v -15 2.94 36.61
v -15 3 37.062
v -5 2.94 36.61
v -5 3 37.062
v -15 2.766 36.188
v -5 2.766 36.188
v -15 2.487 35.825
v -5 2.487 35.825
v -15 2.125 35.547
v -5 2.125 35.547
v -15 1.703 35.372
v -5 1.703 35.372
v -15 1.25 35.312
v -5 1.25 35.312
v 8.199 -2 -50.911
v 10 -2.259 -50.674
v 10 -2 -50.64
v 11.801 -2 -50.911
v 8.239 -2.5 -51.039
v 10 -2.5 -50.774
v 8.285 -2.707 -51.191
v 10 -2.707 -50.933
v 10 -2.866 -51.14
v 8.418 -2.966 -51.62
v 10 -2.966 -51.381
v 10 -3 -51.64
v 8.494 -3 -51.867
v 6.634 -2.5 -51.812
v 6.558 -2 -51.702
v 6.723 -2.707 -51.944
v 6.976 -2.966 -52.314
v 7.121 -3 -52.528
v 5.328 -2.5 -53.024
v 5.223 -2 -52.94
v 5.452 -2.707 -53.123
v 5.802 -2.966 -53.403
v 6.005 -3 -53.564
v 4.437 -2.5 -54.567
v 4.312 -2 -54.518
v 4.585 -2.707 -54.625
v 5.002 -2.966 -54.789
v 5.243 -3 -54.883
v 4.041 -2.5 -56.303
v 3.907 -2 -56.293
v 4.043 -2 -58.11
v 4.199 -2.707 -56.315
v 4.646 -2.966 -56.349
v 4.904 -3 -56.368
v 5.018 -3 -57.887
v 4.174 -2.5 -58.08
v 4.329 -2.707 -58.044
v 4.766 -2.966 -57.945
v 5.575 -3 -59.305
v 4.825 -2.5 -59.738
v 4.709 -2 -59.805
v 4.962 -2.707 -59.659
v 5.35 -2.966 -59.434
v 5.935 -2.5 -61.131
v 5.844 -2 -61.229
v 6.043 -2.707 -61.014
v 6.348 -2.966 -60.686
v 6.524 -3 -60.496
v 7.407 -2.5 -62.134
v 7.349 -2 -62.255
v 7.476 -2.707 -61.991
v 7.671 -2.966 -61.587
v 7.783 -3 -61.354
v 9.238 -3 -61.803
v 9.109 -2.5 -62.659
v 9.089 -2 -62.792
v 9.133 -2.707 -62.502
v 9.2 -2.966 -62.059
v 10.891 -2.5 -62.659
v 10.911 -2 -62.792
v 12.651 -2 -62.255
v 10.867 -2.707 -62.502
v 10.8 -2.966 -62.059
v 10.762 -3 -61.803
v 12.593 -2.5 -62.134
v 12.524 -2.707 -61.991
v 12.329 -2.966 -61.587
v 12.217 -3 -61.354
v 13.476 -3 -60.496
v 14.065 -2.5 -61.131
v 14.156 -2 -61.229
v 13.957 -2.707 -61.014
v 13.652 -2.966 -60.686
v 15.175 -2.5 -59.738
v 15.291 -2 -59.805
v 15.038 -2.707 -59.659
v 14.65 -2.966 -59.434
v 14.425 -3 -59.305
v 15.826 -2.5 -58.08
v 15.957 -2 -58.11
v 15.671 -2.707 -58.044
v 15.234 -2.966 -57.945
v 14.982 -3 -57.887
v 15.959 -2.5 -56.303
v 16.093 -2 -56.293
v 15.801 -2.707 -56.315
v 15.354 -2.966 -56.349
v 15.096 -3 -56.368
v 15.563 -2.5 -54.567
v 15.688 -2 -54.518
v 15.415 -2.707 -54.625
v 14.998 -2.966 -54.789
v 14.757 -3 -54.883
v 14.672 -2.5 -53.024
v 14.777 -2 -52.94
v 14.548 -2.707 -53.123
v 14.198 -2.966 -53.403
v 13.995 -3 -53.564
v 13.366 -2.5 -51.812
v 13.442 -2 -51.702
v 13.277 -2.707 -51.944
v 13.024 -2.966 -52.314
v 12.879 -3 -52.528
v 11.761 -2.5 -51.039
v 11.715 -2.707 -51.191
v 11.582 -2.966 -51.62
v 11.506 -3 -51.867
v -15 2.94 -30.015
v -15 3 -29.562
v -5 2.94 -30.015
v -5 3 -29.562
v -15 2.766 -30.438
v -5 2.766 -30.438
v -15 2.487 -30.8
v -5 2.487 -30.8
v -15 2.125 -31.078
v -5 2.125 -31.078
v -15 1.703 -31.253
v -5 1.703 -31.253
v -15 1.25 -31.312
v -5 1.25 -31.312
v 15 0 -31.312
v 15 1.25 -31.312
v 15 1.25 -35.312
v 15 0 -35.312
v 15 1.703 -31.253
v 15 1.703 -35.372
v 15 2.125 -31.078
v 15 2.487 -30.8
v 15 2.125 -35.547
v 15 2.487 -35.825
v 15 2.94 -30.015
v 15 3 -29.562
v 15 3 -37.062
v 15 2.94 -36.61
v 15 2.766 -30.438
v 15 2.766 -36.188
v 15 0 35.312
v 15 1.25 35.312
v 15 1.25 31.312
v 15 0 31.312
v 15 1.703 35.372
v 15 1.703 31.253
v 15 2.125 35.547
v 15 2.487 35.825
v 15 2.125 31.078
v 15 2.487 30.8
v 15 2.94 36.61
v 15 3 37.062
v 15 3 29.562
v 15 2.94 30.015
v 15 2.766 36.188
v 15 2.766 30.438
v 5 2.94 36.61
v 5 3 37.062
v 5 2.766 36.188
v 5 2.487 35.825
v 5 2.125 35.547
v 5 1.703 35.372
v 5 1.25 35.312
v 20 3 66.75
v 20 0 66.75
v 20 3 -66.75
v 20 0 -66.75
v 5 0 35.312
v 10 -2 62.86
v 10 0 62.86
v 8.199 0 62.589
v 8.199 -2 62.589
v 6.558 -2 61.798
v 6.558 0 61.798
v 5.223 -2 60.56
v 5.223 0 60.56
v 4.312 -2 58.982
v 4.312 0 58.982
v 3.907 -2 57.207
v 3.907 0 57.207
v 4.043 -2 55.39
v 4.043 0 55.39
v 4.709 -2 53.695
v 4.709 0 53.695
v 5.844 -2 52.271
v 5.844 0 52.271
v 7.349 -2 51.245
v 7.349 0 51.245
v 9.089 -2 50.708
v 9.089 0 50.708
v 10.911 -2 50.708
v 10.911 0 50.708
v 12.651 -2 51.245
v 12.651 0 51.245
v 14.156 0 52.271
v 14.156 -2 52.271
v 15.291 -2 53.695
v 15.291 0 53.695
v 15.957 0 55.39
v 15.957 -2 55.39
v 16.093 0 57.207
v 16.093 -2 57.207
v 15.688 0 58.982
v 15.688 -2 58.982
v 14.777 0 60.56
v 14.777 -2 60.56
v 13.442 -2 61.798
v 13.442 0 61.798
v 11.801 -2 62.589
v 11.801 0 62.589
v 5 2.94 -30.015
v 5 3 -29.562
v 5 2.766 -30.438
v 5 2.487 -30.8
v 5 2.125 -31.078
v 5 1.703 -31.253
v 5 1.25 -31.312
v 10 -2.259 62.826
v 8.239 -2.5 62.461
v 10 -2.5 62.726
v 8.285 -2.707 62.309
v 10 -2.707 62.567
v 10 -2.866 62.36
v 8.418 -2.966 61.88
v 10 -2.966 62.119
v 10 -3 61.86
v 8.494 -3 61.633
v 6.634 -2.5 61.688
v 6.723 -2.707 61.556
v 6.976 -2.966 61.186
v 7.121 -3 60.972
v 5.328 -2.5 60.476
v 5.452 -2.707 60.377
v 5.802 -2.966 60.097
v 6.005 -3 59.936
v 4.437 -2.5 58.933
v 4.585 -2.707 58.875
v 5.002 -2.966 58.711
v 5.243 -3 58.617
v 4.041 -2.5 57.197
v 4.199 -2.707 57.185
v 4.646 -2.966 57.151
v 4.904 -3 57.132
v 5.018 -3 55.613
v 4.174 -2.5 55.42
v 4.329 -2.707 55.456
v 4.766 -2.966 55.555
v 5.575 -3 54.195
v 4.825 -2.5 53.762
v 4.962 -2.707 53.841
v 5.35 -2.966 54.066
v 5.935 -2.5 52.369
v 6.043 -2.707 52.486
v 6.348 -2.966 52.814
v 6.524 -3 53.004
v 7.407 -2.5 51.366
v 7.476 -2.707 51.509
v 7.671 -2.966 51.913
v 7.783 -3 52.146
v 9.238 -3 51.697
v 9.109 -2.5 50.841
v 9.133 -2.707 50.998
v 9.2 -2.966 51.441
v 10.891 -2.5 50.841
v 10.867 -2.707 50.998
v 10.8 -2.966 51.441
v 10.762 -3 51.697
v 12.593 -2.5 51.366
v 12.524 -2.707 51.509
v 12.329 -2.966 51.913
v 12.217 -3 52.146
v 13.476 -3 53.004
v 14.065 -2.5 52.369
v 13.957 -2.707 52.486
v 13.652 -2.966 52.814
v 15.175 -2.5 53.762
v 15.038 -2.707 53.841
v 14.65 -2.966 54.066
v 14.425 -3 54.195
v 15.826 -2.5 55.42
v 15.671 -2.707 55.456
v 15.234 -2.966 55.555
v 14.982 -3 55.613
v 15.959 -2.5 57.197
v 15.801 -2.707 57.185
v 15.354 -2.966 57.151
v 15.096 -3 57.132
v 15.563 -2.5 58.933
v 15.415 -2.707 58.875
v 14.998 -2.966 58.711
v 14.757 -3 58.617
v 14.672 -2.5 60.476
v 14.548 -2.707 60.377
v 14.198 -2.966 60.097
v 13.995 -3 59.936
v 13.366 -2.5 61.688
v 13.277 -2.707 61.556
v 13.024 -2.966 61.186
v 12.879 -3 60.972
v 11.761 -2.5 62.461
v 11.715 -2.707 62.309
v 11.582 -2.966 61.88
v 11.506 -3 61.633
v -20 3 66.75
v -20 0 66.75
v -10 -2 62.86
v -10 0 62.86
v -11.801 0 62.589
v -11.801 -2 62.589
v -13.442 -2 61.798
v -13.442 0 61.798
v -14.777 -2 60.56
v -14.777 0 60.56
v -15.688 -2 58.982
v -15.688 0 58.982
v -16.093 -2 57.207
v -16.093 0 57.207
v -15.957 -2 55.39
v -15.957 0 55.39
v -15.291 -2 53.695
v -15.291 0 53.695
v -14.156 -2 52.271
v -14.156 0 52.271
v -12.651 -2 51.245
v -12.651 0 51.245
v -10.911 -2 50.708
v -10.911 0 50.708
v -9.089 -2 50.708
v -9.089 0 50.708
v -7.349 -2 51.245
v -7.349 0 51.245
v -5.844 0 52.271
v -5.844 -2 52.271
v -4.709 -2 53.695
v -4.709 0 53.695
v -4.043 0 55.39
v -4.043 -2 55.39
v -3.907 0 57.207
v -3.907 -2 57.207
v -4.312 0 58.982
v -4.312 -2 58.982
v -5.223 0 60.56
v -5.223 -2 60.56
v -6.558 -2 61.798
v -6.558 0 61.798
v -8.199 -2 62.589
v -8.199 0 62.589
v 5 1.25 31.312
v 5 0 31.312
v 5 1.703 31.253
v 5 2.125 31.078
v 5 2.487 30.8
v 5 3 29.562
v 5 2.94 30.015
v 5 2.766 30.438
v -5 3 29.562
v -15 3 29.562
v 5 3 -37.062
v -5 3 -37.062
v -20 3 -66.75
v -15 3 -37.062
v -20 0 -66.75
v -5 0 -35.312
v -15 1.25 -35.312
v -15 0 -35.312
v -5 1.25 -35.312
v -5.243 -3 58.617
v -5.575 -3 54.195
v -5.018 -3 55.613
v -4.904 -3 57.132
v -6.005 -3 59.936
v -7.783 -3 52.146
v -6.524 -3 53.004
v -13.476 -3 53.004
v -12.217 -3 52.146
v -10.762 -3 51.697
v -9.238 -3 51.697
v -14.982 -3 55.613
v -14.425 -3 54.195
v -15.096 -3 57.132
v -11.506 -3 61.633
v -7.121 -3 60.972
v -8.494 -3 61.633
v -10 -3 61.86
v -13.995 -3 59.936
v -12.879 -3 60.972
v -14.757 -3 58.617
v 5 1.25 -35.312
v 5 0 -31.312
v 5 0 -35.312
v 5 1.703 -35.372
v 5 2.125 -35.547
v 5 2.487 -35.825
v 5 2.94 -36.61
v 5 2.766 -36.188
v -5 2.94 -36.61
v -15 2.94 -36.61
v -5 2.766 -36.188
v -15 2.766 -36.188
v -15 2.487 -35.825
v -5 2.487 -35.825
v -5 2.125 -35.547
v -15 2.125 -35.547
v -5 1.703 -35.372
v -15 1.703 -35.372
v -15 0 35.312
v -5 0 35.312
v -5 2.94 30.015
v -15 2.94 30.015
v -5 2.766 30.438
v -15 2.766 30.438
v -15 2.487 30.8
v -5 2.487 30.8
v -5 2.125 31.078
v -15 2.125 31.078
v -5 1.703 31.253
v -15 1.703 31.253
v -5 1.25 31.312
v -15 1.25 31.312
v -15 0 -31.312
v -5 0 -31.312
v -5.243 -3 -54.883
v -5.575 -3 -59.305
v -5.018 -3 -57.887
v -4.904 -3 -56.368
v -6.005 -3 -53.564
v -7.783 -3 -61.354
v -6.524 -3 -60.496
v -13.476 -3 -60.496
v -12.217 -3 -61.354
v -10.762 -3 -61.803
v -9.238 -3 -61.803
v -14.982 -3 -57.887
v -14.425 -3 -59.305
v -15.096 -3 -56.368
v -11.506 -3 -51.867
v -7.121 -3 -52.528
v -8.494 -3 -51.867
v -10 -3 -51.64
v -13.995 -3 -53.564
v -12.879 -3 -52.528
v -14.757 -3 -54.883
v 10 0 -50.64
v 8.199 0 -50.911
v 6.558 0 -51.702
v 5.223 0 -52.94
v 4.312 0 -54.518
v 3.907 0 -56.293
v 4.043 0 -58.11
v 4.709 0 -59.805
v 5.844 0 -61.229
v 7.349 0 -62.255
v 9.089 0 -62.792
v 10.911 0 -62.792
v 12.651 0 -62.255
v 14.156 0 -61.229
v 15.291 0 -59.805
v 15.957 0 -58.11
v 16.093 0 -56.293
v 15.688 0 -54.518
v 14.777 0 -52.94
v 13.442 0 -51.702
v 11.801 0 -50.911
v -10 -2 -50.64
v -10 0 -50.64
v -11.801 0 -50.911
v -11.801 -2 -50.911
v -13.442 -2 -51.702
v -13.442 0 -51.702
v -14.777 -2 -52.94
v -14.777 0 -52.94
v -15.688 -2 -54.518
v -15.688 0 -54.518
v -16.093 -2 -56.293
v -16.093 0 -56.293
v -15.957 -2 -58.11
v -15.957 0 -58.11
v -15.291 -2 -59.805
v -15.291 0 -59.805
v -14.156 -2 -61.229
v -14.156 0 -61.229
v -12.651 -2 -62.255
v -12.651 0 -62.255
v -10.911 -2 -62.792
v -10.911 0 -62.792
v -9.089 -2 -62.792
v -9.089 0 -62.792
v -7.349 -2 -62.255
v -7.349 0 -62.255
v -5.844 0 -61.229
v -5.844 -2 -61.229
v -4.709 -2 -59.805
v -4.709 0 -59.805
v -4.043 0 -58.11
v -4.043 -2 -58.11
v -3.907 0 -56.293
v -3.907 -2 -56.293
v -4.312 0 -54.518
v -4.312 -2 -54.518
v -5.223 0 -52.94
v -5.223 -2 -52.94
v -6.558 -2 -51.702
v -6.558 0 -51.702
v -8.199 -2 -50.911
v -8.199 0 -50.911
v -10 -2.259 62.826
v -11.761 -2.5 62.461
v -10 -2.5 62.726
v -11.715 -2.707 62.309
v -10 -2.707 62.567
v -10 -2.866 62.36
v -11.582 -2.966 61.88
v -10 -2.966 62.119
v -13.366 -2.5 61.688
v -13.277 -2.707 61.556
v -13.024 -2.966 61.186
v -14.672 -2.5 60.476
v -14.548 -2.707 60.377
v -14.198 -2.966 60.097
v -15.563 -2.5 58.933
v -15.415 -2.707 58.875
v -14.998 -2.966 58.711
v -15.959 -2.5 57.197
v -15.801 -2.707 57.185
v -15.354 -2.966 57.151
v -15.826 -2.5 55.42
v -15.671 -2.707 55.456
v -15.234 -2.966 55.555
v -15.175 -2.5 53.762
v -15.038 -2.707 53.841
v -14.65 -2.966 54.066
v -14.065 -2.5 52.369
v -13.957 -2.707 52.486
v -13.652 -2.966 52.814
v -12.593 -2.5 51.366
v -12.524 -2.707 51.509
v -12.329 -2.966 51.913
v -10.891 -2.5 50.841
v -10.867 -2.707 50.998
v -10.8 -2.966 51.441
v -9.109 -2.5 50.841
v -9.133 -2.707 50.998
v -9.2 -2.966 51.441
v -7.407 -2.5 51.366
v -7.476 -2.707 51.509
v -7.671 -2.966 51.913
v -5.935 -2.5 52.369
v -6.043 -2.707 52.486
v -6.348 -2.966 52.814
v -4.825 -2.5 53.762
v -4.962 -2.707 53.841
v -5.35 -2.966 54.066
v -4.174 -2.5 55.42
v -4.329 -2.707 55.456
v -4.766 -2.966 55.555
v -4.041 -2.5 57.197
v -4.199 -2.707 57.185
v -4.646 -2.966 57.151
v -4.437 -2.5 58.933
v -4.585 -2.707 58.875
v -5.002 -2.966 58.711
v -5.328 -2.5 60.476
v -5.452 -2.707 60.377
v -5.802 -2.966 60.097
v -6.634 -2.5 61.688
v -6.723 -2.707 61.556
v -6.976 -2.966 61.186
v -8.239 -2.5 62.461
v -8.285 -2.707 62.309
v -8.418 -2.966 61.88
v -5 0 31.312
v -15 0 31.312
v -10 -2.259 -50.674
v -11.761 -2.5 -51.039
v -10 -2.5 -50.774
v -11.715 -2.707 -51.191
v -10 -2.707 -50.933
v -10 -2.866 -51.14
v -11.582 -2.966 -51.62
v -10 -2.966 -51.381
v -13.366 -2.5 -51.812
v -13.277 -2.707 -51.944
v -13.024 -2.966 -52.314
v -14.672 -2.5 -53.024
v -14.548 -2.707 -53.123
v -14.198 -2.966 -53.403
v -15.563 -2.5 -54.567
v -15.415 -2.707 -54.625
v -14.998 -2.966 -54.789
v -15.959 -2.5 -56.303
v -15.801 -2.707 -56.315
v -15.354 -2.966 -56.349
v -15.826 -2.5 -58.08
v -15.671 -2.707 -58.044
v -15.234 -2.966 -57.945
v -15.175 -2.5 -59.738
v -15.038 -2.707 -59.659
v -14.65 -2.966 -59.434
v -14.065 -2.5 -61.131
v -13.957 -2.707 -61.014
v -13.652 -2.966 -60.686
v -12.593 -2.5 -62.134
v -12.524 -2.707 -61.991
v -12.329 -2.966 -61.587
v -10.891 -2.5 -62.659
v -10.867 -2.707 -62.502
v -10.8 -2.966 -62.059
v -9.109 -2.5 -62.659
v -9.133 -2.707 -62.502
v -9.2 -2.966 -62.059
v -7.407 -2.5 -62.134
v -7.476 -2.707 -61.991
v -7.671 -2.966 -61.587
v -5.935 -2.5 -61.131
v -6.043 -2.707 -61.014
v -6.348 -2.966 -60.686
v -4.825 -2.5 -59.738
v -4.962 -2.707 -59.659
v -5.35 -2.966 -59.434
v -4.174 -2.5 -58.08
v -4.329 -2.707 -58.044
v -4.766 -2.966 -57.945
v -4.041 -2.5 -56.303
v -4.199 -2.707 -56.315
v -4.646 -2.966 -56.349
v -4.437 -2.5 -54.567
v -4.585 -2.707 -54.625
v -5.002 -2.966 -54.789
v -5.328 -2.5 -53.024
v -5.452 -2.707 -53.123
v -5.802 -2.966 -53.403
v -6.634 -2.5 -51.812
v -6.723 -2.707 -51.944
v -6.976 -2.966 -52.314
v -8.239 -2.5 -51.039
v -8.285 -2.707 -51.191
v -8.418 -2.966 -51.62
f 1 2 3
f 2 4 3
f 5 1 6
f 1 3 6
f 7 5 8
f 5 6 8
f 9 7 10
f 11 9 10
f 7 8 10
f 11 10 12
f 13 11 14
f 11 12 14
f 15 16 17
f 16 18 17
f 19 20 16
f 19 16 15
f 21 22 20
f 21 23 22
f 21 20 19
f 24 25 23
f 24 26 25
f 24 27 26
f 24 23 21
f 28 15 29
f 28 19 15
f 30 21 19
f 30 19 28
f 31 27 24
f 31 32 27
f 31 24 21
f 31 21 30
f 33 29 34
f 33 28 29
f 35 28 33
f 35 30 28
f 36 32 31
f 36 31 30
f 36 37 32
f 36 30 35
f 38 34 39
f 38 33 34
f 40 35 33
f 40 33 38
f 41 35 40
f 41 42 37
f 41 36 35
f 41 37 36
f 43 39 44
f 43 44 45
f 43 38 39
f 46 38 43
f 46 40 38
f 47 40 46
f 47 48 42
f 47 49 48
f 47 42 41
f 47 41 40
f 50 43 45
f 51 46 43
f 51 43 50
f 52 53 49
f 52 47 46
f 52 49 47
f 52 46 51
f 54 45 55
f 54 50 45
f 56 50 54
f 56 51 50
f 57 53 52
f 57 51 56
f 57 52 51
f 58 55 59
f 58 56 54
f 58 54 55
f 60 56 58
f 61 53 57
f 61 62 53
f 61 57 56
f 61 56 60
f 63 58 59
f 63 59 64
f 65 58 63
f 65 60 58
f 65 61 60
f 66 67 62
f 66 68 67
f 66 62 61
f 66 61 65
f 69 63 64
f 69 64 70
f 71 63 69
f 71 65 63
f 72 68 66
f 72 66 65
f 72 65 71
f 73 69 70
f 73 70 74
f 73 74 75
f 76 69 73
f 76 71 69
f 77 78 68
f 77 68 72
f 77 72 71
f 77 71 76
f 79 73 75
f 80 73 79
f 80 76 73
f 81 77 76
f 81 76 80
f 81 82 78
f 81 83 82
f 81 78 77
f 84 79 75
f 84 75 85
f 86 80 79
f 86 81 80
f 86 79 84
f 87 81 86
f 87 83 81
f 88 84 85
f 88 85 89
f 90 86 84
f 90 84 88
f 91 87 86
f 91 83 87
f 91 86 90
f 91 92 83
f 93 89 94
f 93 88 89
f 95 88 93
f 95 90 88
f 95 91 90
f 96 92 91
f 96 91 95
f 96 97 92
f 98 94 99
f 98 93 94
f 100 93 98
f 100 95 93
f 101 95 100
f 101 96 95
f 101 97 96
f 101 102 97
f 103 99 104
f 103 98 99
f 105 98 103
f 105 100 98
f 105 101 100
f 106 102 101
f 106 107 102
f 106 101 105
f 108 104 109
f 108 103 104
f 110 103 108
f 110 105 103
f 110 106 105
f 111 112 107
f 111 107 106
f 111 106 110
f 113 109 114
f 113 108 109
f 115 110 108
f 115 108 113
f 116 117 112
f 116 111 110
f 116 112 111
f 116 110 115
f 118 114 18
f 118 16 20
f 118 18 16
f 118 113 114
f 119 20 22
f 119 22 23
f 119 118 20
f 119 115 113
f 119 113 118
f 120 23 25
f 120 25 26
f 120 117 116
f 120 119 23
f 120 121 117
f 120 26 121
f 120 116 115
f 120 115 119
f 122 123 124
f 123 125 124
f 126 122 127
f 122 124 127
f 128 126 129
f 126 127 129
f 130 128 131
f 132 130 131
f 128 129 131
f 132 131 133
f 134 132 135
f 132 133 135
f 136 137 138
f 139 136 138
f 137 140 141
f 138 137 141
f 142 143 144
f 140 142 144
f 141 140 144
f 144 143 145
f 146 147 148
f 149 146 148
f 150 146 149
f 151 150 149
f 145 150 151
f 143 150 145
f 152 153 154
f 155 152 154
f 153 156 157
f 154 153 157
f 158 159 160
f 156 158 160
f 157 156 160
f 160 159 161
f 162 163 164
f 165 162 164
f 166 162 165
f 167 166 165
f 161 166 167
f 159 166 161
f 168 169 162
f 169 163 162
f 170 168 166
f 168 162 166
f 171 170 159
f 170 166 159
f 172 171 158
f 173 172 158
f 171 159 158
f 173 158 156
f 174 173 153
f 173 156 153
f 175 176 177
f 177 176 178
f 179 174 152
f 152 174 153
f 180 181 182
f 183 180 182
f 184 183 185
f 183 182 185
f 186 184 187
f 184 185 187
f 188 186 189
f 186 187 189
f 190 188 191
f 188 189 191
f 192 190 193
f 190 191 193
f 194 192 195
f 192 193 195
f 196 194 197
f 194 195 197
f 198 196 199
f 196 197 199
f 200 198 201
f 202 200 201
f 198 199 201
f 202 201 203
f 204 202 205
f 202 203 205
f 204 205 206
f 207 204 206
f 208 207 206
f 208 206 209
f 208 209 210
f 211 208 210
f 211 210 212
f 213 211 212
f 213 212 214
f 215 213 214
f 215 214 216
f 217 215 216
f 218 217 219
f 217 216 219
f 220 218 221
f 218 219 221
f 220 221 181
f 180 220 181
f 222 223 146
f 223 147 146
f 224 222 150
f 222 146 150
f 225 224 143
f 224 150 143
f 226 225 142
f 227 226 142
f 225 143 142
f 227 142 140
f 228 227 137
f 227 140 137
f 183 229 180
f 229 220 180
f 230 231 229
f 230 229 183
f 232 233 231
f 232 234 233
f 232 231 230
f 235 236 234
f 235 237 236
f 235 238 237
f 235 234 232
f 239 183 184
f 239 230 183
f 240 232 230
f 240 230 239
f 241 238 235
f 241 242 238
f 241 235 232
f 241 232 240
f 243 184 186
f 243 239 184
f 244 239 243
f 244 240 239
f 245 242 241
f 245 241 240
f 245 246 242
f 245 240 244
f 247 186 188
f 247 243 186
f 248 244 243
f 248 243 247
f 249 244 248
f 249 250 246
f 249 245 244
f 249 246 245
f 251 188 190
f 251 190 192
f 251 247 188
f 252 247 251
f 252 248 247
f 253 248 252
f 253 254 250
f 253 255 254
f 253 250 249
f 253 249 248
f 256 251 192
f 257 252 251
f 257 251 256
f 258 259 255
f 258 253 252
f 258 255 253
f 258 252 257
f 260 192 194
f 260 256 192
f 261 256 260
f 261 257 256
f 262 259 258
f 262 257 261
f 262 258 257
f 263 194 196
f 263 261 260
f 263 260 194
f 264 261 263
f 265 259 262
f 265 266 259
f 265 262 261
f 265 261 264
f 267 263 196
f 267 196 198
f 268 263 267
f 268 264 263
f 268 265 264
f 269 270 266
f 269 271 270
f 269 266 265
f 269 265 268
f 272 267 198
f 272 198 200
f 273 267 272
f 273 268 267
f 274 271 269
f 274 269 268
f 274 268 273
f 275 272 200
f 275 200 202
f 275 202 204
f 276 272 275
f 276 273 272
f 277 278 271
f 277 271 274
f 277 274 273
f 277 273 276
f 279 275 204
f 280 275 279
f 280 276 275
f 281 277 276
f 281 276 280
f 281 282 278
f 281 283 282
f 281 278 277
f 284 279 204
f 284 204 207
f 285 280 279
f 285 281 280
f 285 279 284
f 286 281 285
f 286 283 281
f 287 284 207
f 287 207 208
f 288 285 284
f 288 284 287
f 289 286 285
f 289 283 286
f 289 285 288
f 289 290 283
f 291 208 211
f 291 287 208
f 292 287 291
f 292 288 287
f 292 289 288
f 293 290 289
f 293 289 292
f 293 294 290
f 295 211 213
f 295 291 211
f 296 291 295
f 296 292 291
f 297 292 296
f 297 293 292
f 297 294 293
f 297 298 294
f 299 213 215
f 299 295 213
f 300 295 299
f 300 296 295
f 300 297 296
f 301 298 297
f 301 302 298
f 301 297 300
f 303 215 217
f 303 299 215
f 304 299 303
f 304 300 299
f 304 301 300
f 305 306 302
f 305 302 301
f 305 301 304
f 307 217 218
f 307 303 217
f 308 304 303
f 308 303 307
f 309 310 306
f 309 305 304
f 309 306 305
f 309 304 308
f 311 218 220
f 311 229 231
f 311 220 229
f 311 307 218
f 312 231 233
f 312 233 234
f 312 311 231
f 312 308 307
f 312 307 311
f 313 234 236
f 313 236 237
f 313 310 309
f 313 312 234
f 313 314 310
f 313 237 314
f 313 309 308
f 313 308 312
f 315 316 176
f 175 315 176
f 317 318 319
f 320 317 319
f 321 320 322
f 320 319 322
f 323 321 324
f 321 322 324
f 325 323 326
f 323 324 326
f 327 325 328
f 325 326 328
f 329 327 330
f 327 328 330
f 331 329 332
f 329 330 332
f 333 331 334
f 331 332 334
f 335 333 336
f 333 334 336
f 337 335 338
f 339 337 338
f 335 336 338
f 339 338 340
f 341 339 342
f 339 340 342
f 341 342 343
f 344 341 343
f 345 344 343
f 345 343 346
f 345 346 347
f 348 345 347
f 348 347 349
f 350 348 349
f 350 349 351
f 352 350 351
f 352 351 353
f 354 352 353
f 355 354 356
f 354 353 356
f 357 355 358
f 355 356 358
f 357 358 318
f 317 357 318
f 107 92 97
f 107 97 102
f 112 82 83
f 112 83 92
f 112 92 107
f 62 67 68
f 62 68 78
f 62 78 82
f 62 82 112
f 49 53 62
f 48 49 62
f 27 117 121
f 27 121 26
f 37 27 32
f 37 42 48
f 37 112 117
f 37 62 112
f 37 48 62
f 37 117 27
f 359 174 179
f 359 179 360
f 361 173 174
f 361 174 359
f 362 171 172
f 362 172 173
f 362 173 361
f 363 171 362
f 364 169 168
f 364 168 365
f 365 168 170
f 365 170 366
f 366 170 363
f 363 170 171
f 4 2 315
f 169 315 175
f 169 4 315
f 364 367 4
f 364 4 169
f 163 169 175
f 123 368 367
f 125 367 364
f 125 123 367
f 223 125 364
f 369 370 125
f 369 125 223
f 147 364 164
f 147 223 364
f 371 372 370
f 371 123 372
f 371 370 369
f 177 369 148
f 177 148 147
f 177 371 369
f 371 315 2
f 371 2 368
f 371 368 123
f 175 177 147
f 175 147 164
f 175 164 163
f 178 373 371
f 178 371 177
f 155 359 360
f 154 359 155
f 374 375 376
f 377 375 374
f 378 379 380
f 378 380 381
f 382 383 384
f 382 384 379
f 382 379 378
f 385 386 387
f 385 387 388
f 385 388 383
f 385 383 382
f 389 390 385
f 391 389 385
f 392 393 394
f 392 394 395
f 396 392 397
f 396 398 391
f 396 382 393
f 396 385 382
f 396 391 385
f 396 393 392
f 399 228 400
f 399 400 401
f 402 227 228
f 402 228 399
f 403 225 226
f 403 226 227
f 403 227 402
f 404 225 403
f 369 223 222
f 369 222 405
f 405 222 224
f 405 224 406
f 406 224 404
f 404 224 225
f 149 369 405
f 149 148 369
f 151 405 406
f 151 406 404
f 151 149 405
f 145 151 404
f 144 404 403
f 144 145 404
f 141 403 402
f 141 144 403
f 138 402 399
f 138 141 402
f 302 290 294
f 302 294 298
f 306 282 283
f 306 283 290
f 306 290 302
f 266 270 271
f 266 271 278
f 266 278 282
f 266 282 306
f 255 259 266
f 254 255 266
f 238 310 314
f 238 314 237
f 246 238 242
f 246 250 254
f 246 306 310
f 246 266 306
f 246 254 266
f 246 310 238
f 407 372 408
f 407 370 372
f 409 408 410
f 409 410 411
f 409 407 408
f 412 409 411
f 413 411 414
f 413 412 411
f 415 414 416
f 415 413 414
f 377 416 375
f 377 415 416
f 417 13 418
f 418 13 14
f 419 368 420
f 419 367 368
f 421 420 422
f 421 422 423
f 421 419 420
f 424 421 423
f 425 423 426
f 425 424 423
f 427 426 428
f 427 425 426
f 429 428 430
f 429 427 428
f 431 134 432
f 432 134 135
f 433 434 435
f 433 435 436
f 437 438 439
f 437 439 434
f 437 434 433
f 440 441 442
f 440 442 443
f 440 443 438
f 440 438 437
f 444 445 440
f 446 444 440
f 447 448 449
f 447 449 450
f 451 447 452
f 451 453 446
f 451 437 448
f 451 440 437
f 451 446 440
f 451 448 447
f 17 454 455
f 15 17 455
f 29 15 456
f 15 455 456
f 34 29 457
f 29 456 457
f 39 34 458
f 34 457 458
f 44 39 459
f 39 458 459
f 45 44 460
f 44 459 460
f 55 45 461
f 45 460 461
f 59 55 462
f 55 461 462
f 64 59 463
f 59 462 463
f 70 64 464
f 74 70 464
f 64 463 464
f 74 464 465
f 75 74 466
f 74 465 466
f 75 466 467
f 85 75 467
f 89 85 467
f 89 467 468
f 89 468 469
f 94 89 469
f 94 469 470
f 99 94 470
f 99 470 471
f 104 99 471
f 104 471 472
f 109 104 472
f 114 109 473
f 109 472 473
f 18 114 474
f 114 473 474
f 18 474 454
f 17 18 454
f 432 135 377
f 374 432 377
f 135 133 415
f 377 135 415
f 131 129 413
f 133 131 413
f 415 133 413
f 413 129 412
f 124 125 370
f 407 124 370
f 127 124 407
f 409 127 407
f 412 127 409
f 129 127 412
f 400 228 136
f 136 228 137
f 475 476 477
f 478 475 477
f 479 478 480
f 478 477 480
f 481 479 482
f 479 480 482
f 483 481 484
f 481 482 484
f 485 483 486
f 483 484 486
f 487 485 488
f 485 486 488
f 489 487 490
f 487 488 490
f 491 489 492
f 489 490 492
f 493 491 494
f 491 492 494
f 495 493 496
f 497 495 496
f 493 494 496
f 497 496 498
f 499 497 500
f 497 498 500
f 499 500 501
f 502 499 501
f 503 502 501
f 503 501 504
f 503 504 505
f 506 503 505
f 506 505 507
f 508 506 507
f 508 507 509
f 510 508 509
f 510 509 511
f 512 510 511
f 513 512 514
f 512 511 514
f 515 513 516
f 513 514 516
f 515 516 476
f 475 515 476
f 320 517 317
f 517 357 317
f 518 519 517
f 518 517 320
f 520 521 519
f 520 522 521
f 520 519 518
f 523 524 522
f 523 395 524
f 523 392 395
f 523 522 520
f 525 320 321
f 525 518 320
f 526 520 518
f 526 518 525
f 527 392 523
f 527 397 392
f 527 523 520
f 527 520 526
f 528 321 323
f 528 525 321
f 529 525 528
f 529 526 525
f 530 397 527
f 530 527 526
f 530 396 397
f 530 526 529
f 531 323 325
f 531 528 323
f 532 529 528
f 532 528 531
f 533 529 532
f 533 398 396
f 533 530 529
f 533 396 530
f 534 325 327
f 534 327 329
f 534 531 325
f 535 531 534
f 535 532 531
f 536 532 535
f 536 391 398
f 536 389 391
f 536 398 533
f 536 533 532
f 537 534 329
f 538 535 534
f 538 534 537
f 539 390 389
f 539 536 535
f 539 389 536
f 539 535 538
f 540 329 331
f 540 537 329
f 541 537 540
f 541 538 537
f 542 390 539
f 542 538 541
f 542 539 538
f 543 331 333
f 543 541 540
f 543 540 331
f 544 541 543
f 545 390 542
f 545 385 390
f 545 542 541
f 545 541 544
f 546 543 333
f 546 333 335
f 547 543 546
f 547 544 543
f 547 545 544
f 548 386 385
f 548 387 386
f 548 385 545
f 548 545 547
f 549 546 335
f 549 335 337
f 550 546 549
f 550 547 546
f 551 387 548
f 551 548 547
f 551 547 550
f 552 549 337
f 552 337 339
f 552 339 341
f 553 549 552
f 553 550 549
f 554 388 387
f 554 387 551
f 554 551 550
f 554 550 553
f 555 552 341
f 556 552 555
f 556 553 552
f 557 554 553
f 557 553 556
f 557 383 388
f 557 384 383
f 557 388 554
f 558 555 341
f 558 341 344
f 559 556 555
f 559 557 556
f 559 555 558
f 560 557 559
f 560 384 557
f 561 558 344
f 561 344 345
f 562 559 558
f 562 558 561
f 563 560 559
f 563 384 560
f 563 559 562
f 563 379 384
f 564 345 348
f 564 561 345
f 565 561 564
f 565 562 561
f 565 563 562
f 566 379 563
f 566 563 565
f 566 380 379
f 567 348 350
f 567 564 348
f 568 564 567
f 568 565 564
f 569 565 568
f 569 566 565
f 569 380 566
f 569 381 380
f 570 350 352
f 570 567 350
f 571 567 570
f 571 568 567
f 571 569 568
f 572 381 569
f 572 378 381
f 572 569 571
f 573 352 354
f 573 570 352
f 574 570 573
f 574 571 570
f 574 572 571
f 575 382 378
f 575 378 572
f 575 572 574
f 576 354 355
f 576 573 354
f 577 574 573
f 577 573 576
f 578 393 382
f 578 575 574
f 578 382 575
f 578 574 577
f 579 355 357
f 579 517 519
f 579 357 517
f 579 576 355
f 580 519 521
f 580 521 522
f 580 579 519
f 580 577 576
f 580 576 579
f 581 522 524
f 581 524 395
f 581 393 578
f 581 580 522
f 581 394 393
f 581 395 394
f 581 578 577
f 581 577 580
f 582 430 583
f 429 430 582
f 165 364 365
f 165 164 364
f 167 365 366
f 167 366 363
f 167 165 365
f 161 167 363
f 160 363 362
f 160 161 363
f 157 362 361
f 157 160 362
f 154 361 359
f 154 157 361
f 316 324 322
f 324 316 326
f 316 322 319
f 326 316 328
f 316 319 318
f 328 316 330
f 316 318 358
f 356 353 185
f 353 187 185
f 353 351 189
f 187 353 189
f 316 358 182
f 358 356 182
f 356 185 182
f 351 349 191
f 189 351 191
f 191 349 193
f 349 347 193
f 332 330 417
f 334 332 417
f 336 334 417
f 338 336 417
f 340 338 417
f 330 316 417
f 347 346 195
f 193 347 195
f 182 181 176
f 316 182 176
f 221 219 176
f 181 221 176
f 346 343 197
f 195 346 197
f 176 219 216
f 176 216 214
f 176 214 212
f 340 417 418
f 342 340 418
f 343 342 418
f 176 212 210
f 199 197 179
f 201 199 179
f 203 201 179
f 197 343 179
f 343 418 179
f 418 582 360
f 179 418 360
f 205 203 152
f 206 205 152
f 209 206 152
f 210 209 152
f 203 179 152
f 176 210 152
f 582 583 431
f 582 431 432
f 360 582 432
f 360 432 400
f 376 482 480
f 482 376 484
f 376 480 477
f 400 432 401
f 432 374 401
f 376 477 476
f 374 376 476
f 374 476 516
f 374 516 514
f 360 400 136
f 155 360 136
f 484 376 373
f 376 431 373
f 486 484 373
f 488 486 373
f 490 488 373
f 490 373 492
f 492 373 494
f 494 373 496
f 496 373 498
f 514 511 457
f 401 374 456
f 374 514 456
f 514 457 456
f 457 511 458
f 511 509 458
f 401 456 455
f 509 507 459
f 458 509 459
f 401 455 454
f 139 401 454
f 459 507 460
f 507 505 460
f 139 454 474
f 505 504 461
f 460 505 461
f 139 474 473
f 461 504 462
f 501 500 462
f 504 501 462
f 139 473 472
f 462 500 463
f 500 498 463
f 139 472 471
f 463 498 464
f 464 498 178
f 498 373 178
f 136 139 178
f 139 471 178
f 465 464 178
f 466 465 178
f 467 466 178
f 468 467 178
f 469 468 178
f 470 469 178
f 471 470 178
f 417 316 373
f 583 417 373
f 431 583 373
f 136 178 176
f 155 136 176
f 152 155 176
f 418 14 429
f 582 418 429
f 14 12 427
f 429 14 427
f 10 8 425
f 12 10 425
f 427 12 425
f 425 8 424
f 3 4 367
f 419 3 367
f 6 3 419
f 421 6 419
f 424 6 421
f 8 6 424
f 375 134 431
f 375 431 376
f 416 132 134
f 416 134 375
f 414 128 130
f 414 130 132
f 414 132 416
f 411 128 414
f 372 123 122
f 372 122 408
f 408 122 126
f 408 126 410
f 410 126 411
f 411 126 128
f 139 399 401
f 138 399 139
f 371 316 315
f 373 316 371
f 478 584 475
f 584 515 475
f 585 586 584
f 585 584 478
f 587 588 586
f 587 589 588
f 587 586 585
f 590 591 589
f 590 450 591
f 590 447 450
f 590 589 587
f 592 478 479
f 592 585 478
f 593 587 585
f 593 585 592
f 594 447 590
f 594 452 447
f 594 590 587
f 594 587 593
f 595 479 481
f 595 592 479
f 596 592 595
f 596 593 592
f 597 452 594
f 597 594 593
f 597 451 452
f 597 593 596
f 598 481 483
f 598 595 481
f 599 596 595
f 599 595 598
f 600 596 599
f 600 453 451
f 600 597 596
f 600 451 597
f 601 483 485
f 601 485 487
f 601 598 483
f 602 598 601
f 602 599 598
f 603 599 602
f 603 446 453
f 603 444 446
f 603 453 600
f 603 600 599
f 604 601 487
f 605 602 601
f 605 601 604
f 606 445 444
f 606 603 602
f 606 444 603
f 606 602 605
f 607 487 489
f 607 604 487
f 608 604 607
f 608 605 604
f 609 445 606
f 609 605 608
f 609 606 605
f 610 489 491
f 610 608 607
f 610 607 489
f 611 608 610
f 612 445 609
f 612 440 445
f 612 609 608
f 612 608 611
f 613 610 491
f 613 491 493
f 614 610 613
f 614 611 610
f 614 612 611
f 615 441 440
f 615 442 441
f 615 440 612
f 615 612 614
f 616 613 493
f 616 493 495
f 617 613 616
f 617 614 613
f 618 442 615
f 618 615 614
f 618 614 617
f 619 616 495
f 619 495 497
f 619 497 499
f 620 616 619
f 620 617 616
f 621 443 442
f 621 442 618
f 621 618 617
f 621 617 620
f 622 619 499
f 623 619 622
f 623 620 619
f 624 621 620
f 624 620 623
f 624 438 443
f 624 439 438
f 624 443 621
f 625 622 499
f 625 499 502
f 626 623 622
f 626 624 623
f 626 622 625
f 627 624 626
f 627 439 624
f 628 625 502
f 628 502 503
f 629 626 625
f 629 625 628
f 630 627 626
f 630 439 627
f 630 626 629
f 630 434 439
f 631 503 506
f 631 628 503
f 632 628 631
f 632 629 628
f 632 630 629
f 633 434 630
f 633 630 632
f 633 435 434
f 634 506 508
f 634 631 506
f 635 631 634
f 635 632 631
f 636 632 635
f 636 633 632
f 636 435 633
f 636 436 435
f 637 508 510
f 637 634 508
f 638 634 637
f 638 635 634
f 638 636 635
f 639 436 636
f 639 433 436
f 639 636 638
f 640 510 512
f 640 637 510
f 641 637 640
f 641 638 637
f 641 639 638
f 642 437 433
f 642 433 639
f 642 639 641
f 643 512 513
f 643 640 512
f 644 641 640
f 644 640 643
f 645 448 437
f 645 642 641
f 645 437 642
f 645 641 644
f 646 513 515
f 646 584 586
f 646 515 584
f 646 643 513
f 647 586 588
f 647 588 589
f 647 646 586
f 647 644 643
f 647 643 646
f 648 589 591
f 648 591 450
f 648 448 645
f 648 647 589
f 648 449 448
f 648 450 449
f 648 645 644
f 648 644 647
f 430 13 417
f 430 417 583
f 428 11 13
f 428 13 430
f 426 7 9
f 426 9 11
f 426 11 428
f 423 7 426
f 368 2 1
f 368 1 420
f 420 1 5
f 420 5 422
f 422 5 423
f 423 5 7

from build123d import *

# Parameters (mm, degrees)
SKETCH1_W           = 40
SKETCH1_H           = 133.5
BOSS_EXTRUDE1_DEPTH = 3
SKETCH2_R           = 6.11
BOSS_EXTRUDE2_DEPTH = 3
CUT_EXTRUDE1_REACH  = 71.94
SKETCH3_W           = 10
SKETCH3_H           = 4
FILLET2_R           = 1.75
FILLET3_R           = 1


with BuildPart() as part:
    # Sketch1 → Boss-Extrude1 (new body)
    with BuildSketch(Plane(origin=(0, 0, 0), x_dir=(1, 0, 0), z_dir=(0, 1, 0))):
        Rectangle(SKETCH1_W, SKETCH1_H)
    extrude(amount=BOSS_EXTRUDE1_DEPTH)

    # Sketch2 → Boss-Extrude2 (add)
    with BuildSketch(Plane.XZ):
        with Locations(Location((10, 56.75, 0), (0, 0, 90))):
            Circle(SKETCH2_R)
        with Locations(Location((-10, 56.75, 0), (0, 0, 90))):
            Circle(SKETCH2_R)
        with Locations(Location((-10, -56.75, 0), (0, 0, 90))):
            Circle(SKETCH2_R)
        with Locations(Location((10, -56.75, 0), (0, 0, 90))):
            Circle(SKETCH2_R)
    extrude(amount=BOSS_EXTRUDE2_DEPTH)

    # Sketch3 → Cut-Extrude1 (cut, up to next)
    with BuildSketch(Plane(origin=(0, 3, 0), x_dir=(1, 0, 0), z_dir=(0, 1, 0)), mode=Mode.PRIVATE) as cut_extrude1_sk1:
        with Locations((10, 33.3125)):
            Rectangle(SKETCH3_W, SKETCH3_H)
    cut_extrude1_tool1 = extrude(cut_extrude1_sk1.sketch, amount=-CUT_EXTRUDE1_REACH, mode=Mode.PRIVATE) & part.part
    # Sketch3 → Cut-Extrude1 (cut, up to next)
    with BuildSketch(Plane(origin=(0, 3, 0), x_dir=(1, 0, 0), z_dir=(0, 1, 0)), mode=Mode.PRIVATE) as cut_extrude1_sk2:
        with Locations((-10, 33.3125)):
            Rectangle(SKETCH3_W, SKETCH3_H)
    cut_extrude1_tool2 = extrude(cut_extrude1_sk2.sketch, amount=-CUT_EXTRUDE1_REACH, mode=Mode.PRIVATE) & part.part
    # Sketch3 → Cut-Extrude1 (cut, up to next)
    with BuildSketch(Plane(origin=(0, 3, 0), x_dir=(1, 0, 0), z_dir=(0, 1, 0)), mode=Mode.PRIVATE) as cut_extrude1_sk3:
        with Locations((-10, -33.3125)):
            Rectangle(SKETCH3_W, SKETCH3_H)
    cut_extrude1_tool3 = extrude(cut_extrude1_sk3.sketch, amount=-CUT_EXTRUDE1_REACH, mode=Mode.PRIVATE) & part.part
    # Sketch3 → Cut-Extrude1 (cut, up to next)
    with BuildSketch(Plane(origin=(0, 3, 0), x_dir=(1, 0, 0), z_dir=(0, 1, 0)), mode=Mode.PRIVATE) as cut_extrude1_sk4:
        with Locations((10, -33.3125)):
            Rectangle(SKETCH3_W, SKETCH3_H)
    cut_extrude1_tool4 = extrude(cut_extrude1_sk4.sketch, amount=-CUT_EXTRUDE1_REACH, mode=Mode.PRIVATE) & part.part
    add(cut_extrude1_tool1.solids().sort_by_distance((10, 3, -33.3125))[0], mode=Mode.SUBTRACT)
    add(cut_extrude1_tool2.solids().sort_by_distance((-10, 3, -33.3125))[0], mode=Mode.SUBTRACT)
    add(cut_extrude1_tool3.solids().sort_by_distance((-10, 3, 33.3125))[0], mode=Mode.SUBTRACT)
    add(cut_extrude1_tool4.solids().sort_by_distance((10, 3, 33.3125))[0], mode=Mode.SUBTRACT)

    # Fillet2
    fillet2_edges = [part.edges().sort_by_distance(p)[0] for p in [
        (10, 3, 35.3125),
        (10, 3, 31.3125),
        (-10, 3, 35.3125),
        (-10, 3, 31.3125),
        (-10, 3, -35.3125),
        (-10, 3, -31.3125),
        (10, 3, -35.3125),
        (10, 3, -31.3125),
    ]]
    fillet(fillet2_edges, radius=FILLET2_R)

    # Fillet3
    fillet3_edges = [part.edges().sort_by_distance(p)[0] for p in [
        (10, -3, -62.86),
        (-10, -3, -62.86),
        (-10, -3, 50.64),
        (10, -3, 50.64),
    ]]
    fillet(fillet3_edges, radius=FILLET3_R)


solid = part.part
